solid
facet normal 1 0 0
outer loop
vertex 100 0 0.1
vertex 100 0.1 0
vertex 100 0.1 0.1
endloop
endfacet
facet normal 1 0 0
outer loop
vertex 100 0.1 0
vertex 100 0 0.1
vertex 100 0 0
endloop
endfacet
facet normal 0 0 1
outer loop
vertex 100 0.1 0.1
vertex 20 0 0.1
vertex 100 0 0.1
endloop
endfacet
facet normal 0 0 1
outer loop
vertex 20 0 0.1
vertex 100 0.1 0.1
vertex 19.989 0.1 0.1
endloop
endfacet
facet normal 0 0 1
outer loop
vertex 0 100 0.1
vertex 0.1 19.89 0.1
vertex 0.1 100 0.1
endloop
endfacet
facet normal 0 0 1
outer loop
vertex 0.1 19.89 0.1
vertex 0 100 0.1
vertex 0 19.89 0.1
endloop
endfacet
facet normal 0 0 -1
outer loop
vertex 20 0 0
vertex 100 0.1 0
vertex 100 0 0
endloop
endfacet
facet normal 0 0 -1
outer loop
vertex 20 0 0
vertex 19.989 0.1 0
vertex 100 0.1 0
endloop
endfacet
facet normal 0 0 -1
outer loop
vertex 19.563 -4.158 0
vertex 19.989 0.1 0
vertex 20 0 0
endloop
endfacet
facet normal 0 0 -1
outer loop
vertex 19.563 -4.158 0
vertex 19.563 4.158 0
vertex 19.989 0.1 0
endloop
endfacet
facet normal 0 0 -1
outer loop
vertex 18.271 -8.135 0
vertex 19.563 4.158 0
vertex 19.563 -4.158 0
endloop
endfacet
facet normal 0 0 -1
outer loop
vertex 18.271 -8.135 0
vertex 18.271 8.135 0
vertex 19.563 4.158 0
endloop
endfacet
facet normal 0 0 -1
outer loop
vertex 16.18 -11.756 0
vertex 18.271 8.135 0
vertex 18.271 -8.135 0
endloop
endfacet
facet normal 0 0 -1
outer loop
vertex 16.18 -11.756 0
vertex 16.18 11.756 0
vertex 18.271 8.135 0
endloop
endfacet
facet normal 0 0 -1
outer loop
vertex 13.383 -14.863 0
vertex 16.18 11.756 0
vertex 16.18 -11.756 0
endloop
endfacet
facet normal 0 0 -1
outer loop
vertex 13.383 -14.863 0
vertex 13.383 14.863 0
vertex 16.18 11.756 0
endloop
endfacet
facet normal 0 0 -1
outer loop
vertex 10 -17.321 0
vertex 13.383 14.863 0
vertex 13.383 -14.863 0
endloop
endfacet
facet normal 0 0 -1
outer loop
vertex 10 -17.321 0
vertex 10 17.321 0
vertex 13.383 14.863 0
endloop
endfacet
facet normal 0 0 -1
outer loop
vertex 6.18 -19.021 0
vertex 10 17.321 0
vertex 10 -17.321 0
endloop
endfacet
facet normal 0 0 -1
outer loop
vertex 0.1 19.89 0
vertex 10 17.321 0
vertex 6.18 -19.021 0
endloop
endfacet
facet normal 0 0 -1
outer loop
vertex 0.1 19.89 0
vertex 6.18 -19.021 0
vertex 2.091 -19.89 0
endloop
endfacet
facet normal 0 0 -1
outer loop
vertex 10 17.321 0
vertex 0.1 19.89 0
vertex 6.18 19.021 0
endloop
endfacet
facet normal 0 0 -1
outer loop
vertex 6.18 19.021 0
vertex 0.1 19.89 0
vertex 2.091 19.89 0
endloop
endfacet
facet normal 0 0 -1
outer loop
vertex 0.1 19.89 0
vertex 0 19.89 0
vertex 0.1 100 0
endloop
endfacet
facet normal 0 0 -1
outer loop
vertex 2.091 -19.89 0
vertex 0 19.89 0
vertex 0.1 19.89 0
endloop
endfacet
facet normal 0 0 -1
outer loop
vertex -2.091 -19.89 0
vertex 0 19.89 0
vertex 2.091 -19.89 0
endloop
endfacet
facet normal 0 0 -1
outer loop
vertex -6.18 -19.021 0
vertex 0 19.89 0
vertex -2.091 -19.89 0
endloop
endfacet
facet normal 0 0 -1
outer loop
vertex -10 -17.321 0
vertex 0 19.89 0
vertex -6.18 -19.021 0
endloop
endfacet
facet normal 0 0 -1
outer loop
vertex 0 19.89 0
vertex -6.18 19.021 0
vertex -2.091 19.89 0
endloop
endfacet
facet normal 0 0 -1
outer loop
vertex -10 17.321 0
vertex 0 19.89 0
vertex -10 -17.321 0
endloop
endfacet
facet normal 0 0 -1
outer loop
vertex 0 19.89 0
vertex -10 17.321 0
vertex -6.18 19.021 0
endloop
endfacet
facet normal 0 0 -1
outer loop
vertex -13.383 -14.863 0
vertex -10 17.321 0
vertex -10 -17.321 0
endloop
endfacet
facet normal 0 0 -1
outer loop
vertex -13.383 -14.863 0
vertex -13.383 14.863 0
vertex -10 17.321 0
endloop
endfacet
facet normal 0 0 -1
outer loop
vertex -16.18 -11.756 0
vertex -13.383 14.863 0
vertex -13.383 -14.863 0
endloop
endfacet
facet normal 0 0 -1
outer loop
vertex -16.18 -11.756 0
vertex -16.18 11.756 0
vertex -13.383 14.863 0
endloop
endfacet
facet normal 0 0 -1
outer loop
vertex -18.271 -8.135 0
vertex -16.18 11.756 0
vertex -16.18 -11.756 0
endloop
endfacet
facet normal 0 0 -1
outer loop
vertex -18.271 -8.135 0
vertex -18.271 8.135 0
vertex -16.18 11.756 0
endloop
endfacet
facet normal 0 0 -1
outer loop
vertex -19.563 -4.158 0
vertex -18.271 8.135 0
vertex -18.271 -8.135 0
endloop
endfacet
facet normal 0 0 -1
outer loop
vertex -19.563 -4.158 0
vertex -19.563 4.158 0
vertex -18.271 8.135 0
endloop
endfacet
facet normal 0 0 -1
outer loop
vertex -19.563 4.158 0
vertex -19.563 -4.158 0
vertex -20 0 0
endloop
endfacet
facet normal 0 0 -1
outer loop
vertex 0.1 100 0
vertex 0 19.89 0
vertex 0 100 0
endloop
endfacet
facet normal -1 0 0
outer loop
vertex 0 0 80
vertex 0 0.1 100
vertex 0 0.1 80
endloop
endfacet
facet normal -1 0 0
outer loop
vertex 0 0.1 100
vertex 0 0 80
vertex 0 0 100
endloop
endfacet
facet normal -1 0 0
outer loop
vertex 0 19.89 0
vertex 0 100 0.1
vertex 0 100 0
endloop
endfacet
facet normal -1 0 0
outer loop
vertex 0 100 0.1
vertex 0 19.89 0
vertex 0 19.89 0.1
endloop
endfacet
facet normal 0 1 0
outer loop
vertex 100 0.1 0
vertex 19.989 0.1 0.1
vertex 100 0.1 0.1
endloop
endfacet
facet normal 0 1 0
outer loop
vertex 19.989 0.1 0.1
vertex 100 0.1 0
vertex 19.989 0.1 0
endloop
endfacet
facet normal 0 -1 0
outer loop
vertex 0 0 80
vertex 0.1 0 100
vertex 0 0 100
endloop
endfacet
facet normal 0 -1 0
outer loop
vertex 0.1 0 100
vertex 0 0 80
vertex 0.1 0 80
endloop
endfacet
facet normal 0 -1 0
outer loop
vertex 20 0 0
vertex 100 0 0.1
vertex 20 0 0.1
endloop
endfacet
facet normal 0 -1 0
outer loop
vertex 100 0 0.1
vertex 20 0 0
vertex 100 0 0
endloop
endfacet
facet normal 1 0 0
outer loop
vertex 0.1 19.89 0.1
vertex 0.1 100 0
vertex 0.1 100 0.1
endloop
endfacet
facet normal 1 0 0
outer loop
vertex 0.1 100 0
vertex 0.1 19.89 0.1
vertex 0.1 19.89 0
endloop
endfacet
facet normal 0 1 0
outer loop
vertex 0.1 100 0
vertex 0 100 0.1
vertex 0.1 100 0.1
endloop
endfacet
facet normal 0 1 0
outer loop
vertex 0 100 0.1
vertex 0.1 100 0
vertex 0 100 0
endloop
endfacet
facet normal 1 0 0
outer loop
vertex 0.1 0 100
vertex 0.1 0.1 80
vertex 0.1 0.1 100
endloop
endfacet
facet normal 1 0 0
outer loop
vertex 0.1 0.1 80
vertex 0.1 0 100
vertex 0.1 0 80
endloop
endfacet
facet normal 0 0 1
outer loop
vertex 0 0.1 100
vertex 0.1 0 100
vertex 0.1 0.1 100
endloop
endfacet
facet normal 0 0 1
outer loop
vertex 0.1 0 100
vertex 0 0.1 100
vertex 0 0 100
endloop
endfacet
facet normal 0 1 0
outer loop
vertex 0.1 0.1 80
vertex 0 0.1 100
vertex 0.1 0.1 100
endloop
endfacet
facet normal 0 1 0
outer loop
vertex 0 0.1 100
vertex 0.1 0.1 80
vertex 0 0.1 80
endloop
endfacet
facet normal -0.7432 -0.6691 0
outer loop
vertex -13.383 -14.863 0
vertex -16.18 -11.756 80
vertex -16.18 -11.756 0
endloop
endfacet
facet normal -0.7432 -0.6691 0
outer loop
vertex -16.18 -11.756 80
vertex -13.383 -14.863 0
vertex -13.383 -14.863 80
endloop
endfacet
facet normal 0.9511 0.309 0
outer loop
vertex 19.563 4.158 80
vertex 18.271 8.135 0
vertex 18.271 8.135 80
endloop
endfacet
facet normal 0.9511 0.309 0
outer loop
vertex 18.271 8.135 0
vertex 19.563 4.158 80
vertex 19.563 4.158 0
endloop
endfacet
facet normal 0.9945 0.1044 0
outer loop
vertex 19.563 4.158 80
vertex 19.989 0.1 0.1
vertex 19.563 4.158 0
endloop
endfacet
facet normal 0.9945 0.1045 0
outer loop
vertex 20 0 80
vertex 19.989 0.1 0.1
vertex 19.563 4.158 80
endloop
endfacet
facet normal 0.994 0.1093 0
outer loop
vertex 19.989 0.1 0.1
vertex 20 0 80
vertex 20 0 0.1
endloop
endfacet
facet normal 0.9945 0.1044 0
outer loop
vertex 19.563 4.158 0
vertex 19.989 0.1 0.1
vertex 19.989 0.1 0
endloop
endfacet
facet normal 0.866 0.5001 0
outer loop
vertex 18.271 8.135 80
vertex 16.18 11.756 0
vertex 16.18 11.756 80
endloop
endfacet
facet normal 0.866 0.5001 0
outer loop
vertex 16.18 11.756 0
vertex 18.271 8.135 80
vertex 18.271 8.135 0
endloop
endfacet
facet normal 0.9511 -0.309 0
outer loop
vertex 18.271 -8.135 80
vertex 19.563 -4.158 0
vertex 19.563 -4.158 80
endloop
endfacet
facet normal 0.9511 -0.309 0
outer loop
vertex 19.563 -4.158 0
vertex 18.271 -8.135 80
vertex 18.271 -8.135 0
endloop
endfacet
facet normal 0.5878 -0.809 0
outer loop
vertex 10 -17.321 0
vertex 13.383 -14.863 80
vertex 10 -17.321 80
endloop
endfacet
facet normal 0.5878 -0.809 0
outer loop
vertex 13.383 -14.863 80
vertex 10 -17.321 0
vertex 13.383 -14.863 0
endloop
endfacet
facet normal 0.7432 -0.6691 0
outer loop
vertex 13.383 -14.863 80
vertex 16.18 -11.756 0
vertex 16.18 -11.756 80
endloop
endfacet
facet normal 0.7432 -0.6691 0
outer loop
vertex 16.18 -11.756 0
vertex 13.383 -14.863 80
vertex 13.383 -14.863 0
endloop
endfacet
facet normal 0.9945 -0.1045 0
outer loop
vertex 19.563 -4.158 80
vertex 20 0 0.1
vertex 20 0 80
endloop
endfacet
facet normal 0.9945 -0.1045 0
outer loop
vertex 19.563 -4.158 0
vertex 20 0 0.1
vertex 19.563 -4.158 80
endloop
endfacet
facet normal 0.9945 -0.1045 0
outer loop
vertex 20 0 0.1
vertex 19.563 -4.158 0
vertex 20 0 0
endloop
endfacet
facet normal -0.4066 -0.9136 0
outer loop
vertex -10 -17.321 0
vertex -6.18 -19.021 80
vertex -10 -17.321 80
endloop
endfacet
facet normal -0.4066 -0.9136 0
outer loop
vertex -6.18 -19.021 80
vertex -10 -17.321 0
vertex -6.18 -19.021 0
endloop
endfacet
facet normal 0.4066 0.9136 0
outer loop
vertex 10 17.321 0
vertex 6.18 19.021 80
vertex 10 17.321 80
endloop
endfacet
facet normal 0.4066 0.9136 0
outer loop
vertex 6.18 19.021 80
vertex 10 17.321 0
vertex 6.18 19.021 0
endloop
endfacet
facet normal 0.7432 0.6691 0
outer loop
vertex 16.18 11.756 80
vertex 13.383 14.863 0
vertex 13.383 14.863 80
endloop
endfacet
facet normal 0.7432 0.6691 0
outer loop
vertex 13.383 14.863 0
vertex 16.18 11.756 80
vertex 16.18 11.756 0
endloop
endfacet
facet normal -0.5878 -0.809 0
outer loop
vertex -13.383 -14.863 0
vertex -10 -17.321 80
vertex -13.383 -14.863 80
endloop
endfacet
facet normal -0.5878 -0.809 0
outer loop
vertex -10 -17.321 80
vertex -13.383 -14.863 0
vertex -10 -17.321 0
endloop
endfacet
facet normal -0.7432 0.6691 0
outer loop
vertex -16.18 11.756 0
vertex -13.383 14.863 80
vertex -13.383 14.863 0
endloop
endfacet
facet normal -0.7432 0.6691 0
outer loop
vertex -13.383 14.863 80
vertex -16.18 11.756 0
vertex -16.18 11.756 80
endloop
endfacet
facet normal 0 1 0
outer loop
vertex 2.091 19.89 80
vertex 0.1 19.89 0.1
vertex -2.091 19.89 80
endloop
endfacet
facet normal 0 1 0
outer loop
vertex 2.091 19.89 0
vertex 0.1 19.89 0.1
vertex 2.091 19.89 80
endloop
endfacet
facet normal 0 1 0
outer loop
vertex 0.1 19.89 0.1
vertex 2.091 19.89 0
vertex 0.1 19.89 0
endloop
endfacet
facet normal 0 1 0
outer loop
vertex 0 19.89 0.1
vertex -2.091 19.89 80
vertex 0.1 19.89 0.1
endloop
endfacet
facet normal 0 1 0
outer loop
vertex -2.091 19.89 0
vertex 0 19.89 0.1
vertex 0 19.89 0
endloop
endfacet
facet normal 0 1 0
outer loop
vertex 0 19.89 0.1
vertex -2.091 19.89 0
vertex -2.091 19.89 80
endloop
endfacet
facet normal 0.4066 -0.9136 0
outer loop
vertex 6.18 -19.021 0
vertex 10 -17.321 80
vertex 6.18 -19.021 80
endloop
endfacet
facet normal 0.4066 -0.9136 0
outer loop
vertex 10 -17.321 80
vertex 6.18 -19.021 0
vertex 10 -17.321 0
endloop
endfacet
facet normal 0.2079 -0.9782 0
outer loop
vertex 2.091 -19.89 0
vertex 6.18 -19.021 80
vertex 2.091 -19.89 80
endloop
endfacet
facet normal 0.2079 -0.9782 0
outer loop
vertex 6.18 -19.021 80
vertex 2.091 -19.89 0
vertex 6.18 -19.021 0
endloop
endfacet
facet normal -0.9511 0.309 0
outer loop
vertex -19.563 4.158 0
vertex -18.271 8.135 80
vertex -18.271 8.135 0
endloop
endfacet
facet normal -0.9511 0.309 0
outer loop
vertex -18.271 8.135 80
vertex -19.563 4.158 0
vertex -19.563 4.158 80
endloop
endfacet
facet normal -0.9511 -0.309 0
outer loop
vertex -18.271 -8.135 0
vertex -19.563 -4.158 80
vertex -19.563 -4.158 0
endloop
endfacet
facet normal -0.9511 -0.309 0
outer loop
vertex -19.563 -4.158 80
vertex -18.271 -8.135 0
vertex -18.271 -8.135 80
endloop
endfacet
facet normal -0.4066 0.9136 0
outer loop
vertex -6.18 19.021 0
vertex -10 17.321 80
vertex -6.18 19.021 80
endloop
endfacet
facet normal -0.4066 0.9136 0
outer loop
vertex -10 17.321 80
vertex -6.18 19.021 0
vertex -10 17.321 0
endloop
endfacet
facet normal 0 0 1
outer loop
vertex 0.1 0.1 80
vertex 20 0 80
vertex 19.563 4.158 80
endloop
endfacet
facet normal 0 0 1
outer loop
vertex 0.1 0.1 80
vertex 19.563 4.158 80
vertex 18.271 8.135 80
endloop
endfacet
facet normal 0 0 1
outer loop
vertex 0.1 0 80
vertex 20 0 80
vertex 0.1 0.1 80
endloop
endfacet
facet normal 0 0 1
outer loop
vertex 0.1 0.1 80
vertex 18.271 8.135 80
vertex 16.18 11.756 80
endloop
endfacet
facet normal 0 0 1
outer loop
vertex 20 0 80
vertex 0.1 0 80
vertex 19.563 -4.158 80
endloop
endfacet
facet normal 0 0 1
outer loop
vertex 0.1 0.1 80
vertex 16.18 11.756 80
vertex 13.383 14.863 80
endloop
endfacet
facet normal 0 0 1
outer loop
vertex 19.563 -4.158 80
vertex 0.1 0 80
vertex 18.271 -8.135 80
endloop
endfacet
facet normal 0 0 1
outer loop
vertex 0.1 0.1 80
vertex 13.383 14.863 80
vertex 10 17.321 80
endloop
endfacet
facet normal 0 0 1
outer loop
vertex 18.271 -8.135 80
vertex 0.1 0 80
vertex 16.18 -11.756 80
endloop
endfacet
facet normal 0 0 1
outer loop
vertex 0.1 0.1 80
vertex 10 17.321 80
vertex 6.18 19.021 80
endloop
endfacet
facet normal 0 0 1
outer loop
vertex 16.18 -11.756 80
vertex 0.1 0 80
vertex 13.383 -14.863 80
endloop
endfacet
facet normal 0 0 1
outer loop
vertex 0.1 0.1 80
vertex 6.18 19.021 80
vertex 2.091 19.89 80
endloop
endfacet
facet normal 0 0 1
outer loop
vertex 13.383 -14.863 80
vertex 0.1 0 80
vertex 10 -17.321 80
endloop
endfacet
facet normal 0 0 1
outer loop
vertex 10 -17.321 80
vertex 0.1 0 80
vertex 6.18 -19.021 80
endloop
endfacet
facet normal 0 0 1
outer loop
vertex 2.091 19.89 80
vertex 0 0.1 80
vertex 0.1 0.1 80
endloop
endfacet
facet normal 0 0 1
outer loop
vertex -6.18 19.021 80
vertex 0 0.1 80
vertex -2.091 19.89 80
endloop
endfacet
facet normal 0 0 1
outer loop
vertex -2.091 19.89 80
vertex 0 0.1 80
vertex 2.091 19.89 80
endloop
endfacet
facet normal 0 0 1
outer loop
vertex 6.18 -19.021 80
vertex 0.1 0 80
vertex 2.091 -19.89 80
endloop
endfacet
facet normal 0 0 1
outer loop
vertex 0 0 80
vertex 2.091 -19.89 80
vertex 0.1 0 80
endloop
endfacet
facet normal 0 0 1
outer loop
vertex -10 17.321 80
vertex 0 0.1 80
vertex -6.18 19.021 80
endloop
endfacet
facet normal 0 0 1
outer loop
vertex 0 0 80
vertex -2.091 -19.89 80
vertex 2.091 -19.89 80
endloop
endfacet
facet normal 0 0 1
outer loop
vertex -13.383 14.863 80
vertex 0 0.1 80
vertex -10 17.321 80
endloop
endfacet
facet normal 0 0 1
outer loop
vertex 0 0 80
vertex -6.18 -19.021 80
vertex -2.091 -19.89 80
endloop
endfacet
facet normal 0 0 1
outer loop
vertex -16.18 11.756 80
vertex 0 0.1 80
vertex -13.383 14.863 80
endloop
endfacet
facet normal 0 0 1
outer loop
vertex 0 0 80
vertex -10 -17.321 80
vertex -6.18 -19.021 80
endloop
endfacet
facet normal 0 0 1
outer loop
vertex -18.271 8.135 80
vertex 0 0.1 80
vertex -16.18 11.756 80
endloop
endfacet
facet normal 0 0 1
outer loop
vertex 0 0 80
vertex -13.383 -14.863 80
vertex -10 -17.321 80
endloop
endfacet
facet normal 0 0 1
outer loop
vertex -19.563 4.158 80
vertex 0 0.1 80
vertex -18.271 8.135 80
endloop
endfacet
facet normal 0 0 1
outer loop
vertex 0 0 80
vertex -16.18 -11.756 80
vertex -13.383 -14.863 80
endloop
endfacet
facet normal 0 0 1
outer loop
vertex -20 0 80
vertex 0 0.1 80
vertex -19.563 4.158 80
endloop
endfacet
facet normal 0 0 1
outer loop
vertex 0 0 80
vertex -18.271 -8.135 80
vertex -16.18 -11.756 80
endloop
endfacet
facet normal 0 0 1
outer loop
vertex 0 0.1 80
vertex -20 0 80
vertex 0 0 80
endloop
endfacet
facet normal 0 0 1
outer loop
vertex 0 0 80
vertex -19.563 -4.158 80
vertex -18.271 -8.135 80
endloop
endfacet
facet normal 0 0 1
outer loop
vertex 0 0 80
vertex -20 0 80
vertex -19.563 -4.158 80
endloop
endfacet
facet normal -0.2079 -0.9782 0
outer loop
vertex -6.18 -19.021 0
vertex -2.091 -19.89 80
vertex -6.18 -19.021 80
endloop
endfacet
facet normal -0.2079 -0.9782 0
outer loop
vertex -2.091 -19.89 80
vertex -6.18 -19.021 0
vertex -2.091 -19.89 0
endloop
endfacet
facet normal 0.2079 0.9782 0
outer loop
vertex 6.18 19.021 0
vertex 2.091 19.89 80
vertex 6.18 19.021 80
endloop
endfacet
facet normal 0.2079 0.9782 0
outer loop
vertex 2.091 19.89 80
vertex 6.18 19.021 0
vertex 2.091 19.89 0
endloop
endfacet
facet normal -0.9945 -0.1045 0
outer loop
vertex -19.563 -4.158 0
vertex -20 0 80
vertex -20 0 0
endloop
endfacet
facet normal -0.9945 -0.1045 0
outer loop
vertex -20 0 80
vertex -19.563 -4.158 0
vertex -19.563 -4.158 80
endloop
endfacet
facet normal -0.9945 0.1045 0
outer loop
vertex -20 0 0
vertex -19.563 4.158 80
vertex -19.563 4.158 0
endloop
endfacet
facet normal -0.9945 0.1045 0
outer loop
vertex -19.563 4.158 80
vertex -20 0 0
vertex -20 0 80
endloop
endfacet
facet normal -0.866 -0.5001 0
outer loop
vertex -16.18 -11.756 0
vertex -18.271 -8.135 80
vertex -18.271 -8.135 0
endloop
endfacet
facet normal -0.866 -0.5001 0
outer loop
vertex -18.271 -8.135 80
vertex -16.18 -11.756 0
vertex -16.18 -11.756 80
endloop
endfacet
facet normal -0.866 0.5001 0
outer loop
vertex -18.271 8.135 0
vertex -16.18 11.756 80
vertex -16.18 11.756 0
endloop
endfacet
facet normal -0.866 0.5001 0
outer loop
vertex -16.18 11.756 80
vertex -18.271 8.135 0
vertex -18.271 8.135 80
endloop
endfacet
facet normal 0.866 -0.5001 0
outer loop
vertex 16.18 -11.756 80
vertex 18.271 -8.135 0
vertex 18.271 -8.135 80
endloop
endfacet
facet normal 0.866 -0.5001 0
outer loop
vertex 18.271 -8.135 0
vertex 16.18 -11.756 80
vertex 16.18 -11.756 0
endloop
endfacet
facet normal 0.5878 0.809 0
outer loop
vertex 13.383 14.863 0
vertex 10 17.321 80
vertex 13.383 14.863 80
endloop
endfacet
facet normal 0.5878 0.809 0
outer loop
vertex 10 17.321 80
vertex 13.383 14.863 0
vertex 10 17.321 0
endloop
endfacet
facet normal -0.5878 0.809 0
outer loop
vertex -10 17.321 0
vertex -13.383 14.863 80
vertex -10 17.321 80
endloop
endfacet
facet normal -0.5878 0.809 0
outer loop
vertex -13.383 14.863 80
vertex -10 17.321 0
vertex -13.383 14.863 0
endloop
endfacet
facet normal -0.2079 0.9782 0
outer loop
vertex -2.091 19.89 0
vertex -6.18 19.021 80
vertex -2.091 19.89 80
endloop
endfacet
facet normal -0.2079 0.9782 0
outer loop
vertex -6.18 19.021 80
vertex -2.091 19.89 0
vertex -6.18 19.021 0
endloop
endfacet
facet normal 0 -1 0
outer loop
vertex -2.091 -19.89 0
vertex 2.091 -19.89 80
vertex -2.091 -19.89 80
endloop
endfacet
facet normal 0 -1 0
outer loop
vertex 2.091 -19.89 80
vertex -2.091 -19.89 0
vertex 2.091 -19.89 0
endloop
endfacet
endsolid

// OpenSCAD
    // Combined Scene

    // Permanent Model
    
    // Permanent Model (Black)
    color([0, 0, 0]) {
        // Your permanent model code here
        cube([100,0.1,0.1], center = false);
        cube([0.1,100,0.1], center = false);
        cube([0.1,0.1,100], center = false);
    }
    

    // Dynamic Model
    cylinder(h = 80, r = 20);
    
